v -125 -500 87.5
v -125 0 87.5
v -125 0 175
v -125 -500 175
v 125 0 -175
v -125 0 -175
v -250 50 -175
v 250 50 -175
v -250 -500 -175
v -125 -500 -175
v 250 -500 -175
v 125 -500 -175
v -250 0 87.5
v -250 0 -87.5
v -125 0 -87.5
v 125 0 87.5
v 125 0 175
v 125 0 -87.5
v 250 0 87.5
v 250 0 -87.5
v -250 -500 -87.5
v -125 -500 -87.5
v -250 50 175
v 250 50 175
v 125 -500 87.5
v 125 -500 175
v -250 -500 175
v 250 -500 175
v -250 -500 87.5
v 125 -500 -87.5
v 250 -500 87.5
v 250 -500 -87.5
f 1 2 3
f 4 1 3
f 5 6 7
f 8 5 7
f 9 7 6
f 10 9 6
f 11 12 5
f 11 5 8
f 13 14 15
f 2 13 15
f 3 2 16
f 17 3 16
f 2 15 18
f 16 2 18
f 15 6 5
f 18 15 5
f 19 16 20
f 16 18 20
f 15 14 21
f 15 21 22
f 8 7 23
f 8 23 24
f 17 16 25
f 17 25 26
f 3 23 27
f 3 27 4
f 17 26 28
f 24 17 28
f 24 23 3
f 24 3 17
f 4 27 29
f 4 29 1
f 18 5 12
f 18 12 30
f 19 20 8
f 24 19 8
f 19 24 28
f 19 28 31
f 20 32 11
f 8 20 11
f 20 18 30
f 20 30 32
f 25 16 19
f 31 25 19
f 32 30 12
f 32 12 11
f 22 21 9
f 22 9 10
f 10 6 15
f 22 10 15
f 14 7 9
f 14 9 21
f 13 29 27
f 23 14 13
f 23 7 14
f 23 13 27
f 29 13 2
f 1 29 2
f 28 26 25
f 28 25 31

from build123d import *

# Parameters (mm, degrees)
CROQUIS2_W              = 500
CROQUIS2_H              = 350
SALIENTE_EXTRUIR1_DEPTH = 50
CROQUIS3_W              = 125
CROQUIS3_H              = 87.5
SALIENTE_EXTRUIR2_DEPTH = 500


with BuildPart() as part:
    # Croquis2 → Saliente-Extruir1 (new body)
    with BuildSketch(Plane(origin=(0, 0, 0), x_dir=(1, 0, 0), z_dir=(0, 1, 0))):
        Rectangle(CROQUIS2_W, CROQUIS2_H)
    extrude(amount=SALIENTE_EXTRUIR1_DEPTH)

    # Croquis3 → Saliente-Extruir2 (add)
    with BuildSketch(Plane.XZ):
        with Locations((-187.5, 131.25)):
            Rectangle(CROQUIS3_W, CROQUIS3_H)
        with Locations((-187.5, -131.25)):
            Rectangle(CROQUIS3_W, CROQUIS3_H)
        with Locations((187.5, -131.25)):
            Rectangle(CROQUIS3_W, CROQUIS3_H)
        with Locations((187.5, 131.25)):
            Rectangle(CROQUIS3_W, CROQUIS3_H)
    extrude(amount=SALIENTE_EXTRUIR2_DEPTH)


solid = part.part
